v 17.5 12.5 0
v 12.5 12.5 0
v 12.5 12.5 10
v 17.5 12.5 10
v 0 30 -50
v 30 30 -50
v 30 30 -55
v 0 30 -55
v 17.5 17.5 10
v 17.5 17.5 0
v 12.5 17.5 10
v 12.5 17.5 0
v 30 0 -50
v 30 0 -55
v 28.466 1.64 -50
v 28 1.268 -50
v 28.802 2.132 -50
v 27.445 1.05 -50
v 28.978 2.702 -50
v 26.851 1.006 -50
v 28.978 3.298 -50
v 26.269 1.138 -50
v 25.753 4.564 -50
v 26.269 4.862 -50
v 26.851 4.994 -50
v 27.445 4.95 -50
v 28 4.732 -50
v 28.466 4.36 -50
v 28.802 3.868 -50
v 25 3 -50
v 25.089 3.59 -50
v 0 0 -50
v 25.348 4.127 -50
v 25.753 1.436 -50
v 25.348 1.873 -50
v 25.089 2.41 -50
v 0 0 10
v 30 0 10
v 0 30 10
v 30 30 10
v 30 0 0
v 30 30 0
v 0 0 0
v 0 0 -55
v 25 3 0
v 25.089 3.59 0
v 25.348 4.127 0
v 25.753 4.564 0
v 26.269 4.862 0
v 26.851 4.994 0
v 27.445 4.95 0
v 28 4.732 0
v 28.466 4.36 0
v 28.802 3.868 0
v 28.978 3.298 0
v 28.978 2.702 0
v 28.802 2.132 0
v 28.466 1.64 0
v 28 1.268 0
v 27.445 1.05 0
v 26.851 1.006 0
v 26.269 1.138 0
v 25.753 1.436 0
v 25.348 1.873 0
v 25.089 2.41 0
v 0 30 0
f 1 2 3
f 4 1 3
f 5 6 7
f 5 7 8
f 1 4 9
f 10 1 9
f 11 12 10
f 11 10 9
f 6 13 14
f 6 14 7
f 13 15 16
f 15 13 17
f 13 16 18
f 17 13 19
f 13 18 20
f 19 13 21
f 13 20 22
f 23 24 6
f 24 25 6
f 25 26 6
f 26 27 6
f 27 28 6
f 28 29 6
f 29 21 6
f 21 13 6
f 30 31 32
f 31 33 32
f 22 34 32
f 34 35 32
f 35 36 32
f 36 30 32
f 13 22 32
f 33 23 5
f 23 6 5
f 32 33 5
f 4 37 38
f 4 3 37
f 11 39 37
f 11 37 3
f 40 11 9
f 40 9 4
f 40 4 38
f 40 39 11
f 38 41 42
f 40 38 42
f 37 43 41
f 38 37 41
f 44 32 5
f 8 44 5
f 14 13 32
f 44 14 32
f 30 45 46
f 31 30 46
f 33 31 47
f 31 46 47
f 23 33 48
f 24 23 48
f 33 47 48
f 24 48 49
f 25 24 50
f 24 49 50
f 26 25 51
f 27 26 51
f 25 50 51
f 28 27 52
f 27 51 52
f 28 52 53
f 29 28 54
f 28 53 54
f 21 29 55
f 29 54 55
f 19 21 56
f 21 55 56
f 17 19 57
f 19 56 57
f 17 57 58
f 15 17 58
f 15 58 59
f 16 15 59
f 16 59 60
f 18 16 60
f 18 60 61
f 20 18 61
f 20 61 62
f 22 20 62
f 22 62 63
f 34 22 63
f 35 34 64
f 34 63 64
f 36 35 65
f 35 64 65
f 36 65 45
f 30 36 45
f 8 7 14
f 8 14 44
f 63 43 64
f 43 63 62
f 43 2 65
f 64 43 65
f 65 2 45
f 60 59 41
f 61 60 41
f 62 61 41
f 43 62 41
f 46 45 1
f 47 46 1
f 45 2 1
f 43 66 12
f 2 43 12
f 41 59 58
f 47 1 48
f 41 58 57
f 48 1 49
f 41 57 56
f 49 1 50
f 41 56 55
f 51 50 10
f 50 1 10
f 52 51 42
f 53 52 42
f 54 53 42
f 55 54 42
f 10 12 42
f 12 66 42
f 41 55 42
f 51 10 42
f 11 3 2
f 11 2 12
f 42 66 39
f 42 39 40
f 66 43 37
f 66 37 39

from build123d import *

# Parameters (mm, degrees)
SKETCH1_W           = 30
SKETCH1_H           = 30
BOSS_EXTRUDE1_DEPTH = 10
SKETCH3_R           = 2
BOSS_EXTRUDE4_DEPTH = 50
SKETCH4_W           = 30
SKETCH4_H           = 30
BOSS_EXTRUDE5_DEPTH = 5
CAVITY1_START       = 12.5
CAVITY1_OUTLINE_W   = 5
CAVITY1_OUTLINE_H   = 10
CAVITY1_DEPTH       = 5


# Read off the part's stored shape, not the designer's step: Cavity1
with BuildPart() as part:
    # Sketch1 → Boss-Extrude1 (new body)
    with BuildSketch(Plane.XY):
        with Locations((15, 15)):
            Rectangle(SKETCH1_W, SKETCH1_H)
    extrude(amount=BOSS_EXTRUDE1_DEPTH)

    # Sketch3 → Boss-Extrude4 (add)
    with BuildSketch(Plane(origin=(0, 0, 0), x_dir=(-1, 0, 0), z_dir=(0, 0, -1))):
        with Locations((-27, 3)):
            Circle(SKETCH3_R)
    extrude(amount=BOSS_EXTRUDE4_DEPTH)

    # Sketch4 → Boss-Extrude5 (add)
    with BuildSketch(Plane(origin=(0, 0, -50), x_dir=(-1, 0, 0), z_dir=(0, 0, -1))):
        with Locations((-15, 15)):
            Rectangle(SKETCH4_W, SKETCH4_H)
    extrude(amount=BOSS_EXTRUDE5_DEPTH)

    # Cavity1 outline → Cavity1 (cut)
    with BuildSketch(Plane.YZ.offset(CAVITY1_START)):
        with Locations((15, 5)):
            Rectangle(CAVITY1_OUTLINE_W, CAVITY1_OUTLINE_H)
    extrude(amount=CAVITY1_DEPTH, mode=Mode.SUBTRACT)


solid = part.part
